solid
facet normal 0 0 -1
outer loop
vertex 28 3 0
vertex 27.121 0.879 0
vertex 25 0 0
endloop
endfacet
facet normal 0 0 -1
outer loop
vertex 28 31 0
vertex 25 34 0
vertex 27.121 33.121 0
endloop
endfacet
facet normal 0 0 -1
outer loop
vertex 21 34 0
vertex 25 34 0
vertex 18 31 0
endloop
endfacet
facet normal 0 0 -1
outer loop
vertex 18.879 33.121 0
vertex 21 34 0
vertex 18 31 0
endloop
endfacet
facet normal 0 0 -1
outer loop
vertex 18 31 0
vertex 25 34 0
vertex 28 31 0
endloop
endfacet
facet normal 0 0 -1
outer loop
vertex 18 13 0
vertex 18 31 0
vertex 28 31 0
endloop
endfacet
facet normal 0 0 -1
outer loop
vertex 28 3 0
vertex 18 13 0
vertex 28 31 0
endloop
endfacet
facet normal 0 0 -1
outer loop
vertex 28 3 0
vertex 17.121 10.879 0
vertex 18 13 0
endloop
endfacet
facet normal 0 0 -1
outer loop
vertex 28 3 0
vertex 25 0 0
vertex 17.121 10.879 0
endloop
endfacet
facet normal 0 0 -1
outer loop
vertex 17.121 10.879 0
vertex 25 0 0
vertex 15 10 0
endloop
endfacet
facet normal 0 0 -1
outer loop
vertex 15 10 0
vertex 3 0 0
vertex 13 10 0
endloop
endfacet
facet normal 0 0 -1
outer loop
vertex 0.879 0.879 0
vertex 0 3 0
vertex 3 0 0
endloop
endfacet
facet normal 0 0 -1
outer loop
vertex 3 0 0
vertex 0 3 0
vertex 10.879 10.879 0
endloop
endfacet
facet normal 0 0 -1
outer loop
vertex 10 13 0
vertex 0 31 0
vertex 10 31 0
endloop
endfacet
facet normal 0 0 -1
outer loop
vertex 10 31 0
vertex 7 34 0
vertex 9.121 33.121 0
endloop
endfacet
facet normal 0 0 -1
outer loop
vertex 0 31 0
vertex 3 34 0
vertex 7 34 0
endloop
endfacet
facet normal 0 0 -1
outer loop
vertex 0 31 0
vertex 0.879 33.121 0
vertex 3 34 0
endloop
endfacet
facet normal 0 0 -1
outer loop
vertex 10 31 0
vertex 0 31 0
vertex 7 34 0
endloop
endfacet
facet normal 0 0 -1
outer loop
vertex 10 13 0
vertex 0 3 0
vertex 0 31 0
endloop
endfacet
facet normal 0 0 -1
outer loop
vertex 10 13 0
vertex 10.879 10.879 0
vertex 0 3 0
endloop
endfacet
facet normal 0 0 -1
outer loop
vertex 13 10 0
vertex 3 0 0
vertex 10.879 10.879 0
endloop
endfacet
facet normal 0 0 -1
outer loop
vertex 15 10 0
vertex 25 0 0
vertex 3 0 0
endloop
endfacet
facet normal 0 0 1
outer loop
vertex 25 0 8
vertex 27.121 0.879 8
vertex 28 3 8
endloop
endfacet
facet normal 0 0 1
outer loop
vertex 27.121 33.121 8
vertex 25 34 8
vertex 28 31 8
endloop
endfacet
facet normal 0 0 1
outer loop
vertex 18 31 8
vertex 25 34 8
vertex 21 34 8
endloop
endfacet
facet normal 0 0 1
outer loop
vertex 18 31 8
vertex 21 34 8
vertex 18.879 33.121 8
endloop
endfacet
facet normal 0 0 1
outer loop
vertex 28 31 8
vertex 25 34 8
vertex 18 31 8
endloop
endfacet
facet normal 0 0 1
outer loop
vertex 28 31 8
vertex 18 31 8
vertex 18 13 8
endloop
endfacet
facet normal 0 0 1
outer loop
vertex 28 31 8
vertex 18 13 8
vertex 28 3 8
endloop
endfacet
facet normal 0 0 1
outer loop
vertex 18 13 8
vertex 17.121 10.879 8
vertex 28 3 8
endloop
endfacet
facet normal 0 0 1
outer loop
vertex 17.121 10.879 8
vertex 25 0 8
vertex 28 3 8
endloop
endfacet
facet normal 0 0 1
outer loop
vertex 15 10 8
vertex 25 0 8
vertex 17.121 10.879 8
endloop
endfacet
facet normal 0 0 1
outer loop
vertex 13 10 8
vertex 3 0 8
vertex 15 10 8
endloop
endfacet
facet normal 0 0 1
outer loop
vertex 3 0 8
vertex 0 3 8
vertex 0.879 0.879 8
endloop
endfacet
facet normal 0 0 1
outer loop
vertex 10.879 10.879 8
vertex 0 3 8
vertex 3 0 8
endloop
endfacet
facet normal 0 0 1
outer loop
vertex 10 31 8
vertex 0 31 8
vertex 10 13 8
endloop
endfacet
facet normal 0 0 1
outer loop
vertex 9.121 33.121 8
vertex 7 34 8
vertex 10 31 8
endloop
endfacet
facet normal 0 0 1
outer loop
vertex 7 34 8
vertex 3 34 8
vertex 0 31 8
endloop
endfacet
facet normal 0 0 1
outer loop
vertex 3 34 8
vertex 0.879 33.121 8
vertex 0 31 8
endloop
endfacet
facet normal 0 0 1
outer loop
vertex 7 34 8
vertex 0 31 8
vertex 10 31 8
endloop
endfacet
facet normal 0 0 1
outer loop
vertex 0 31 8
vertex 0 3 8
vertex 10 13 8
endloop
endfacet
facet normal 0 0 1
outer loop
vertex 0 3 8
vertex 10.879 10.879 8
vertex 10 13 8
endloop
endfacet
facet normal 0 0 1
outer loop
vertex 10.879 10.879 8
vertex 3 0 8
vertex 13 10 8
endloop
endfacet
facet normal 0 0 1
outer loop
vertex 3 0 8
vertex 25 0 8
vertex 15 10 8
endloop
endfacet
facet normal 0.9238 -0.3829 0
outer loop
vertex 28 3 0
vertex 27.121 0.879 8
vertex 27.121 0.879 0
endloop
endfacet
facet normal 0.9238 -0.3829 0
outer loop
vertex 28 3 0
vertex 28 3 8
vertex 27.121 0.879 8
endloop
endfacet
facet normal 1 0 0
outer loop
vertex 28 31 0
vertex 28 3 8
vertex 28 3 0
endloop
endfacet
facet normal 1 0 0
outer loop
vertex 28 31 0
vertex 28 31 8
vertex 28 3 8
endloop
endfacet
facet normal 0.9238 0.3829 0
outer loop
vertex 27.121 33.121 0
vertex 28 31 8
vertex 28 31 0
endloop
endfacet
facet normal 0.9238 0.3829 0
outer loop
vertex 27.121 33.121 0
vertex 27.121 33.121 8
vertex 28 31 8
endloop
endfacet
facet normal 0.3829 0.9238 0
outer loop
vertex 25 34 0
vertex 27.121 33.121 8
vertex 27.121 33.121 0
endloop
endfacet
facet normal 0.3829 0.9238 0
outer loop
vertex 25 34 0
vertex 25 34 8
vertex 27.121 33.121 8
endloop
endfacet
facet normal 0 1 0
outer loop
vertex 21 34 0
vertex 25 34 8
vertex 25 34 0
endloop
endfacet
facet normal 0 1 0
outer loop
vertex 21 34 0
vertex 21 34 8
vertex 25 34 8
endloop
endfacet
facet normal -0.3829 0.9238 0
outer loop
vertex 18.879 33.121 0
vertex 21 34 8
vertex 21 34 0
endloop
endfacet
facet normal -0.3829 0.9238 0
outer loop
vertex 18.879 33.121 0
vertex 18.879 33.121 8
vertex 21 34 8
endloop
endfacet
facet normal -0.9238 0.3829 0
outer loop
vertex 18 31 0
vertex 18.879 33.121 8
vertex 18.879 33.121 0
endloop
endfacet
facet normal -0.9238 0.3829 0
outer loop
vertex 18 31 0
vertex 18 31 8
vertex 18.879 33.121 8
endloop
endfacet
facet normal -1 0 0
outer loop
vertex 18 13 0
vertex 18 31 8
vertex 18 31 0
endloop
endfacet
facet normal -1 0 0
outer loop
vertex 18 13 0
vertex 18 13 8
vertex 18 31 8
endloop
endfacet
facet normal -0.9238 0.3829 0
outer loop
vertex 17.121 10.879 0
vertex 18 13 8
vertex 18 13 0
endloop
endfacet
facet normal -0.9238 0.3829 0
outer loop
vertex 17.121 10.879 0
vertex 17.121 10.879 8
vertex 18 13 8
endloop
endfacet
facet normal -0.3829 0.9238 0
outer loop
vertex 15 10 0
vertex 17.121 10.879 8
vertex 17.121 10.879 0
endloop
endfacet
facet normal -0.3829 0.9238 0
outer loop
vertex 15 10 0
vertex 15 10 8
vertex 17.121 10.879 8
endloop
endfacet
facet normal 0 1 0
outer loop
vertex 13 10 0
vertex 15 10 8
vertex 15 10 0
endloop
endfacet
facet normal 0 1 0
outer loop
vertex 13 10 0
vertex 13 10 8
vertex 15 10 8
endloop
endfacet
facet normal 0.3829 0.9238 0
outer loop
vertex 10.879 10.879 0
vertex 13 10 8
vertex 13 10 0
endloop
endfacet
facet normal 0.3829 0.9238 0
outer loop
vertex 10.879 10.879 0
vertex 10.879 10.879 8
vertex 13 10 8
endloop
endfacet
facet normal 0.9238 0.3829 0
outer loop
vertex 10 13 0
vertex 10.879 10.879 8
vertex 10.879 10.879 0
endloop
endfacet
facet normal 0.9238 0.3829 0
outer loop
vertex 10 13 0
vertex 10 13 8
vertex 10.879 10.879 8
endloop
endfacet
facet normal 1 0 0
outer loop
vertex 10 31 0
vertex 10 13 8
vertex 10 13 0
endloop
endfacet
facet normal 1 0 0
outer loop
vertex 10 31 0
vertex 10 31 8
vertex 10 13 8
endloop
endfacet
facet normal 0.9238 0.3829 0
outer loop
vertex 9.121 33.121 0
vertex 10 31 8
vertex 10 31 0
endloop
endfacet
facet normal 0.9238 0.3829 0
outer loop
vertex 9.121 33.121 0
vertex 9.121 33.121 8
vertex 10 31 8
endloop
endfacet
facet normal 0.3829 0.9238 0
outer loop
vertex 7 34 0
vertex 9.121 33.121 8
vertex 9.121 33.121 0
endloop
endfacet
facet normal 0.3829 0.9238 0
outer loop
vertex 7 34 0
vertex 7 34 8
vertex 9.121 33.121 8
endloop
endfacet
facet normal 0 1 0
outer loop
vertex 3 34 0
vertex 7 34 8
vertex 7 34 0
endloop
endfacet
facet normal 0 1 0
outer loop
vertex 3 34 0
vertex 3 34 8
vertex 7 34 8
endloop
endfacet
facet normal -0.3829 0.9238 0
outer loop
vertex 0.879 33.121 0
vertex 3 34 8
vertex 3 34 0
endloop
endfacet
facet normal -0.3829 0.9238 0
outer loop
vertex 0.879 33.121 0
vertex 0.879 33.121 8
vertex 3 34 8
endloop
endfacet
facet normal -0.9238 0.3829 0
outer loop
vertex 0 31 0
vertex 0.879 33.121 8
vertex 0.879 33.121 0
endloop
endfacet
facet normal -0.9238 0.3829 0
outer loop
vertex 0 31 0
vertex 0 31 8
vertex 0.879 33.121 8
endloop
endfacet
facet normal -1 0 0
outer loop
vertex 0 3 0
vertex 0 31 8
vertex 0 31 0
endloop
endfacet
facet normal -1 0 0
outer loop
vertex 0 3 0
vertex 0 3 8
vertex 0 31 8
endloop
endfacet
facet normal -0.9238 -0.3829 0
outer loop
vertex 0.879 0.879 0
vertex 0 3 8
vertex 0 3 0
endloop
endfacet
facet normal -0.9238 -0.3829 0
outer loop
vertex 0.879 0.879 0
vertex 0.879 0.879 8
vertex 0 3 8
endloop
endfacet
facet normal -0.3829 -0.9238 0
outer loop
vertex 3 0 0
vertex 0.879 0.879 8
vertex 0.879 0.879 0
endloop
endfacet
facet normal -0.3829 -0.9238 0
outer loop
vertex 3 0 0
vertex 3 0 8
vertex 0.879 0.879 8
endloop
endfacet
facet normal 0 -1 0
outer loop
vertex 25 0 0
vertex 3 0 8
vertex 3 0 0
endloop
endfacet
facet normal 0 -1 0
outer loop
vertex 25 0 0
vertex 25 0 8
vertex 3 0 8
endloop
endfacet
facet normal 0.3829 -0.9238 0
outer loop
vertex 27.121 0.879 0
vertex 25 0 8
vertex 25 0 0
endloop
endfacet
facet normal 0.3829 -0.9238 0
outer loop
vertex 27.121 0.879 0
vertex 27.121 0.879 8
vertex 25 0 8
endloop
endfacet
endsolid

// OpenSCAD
$fn = 32;

// ----------------------------------------------------------------------
// Eye lug: clevis, 8 mm thick
// ----------------------------------------------------------------------

// --- parameters (mm) ---
profile_height = 8;       // extrusion height
profile_points = 24;      // points of the closed outline

profile = [[0, 3], [0.879, 0.879], [3, 0], [25, 0], [27.121, 0.879], [28, 3], [28, 31], [27.121, 33.121], [25, 34], [21, 34], [18.879, 33.121], [18, 31], [18, 13], [17.121, 10.879], [15, 10], [13, 10], [10.879, 10.879], [10, 13], [10, 31], [9.121, 33.121], [7, 34], [3, 34], [0.879, 33.121], [0, 31]];  // single closed polygon, 24 points, counter clockwise

// --- the one profile operation ---
linear_extrude(height = profile_height) polygon(points = profile);
